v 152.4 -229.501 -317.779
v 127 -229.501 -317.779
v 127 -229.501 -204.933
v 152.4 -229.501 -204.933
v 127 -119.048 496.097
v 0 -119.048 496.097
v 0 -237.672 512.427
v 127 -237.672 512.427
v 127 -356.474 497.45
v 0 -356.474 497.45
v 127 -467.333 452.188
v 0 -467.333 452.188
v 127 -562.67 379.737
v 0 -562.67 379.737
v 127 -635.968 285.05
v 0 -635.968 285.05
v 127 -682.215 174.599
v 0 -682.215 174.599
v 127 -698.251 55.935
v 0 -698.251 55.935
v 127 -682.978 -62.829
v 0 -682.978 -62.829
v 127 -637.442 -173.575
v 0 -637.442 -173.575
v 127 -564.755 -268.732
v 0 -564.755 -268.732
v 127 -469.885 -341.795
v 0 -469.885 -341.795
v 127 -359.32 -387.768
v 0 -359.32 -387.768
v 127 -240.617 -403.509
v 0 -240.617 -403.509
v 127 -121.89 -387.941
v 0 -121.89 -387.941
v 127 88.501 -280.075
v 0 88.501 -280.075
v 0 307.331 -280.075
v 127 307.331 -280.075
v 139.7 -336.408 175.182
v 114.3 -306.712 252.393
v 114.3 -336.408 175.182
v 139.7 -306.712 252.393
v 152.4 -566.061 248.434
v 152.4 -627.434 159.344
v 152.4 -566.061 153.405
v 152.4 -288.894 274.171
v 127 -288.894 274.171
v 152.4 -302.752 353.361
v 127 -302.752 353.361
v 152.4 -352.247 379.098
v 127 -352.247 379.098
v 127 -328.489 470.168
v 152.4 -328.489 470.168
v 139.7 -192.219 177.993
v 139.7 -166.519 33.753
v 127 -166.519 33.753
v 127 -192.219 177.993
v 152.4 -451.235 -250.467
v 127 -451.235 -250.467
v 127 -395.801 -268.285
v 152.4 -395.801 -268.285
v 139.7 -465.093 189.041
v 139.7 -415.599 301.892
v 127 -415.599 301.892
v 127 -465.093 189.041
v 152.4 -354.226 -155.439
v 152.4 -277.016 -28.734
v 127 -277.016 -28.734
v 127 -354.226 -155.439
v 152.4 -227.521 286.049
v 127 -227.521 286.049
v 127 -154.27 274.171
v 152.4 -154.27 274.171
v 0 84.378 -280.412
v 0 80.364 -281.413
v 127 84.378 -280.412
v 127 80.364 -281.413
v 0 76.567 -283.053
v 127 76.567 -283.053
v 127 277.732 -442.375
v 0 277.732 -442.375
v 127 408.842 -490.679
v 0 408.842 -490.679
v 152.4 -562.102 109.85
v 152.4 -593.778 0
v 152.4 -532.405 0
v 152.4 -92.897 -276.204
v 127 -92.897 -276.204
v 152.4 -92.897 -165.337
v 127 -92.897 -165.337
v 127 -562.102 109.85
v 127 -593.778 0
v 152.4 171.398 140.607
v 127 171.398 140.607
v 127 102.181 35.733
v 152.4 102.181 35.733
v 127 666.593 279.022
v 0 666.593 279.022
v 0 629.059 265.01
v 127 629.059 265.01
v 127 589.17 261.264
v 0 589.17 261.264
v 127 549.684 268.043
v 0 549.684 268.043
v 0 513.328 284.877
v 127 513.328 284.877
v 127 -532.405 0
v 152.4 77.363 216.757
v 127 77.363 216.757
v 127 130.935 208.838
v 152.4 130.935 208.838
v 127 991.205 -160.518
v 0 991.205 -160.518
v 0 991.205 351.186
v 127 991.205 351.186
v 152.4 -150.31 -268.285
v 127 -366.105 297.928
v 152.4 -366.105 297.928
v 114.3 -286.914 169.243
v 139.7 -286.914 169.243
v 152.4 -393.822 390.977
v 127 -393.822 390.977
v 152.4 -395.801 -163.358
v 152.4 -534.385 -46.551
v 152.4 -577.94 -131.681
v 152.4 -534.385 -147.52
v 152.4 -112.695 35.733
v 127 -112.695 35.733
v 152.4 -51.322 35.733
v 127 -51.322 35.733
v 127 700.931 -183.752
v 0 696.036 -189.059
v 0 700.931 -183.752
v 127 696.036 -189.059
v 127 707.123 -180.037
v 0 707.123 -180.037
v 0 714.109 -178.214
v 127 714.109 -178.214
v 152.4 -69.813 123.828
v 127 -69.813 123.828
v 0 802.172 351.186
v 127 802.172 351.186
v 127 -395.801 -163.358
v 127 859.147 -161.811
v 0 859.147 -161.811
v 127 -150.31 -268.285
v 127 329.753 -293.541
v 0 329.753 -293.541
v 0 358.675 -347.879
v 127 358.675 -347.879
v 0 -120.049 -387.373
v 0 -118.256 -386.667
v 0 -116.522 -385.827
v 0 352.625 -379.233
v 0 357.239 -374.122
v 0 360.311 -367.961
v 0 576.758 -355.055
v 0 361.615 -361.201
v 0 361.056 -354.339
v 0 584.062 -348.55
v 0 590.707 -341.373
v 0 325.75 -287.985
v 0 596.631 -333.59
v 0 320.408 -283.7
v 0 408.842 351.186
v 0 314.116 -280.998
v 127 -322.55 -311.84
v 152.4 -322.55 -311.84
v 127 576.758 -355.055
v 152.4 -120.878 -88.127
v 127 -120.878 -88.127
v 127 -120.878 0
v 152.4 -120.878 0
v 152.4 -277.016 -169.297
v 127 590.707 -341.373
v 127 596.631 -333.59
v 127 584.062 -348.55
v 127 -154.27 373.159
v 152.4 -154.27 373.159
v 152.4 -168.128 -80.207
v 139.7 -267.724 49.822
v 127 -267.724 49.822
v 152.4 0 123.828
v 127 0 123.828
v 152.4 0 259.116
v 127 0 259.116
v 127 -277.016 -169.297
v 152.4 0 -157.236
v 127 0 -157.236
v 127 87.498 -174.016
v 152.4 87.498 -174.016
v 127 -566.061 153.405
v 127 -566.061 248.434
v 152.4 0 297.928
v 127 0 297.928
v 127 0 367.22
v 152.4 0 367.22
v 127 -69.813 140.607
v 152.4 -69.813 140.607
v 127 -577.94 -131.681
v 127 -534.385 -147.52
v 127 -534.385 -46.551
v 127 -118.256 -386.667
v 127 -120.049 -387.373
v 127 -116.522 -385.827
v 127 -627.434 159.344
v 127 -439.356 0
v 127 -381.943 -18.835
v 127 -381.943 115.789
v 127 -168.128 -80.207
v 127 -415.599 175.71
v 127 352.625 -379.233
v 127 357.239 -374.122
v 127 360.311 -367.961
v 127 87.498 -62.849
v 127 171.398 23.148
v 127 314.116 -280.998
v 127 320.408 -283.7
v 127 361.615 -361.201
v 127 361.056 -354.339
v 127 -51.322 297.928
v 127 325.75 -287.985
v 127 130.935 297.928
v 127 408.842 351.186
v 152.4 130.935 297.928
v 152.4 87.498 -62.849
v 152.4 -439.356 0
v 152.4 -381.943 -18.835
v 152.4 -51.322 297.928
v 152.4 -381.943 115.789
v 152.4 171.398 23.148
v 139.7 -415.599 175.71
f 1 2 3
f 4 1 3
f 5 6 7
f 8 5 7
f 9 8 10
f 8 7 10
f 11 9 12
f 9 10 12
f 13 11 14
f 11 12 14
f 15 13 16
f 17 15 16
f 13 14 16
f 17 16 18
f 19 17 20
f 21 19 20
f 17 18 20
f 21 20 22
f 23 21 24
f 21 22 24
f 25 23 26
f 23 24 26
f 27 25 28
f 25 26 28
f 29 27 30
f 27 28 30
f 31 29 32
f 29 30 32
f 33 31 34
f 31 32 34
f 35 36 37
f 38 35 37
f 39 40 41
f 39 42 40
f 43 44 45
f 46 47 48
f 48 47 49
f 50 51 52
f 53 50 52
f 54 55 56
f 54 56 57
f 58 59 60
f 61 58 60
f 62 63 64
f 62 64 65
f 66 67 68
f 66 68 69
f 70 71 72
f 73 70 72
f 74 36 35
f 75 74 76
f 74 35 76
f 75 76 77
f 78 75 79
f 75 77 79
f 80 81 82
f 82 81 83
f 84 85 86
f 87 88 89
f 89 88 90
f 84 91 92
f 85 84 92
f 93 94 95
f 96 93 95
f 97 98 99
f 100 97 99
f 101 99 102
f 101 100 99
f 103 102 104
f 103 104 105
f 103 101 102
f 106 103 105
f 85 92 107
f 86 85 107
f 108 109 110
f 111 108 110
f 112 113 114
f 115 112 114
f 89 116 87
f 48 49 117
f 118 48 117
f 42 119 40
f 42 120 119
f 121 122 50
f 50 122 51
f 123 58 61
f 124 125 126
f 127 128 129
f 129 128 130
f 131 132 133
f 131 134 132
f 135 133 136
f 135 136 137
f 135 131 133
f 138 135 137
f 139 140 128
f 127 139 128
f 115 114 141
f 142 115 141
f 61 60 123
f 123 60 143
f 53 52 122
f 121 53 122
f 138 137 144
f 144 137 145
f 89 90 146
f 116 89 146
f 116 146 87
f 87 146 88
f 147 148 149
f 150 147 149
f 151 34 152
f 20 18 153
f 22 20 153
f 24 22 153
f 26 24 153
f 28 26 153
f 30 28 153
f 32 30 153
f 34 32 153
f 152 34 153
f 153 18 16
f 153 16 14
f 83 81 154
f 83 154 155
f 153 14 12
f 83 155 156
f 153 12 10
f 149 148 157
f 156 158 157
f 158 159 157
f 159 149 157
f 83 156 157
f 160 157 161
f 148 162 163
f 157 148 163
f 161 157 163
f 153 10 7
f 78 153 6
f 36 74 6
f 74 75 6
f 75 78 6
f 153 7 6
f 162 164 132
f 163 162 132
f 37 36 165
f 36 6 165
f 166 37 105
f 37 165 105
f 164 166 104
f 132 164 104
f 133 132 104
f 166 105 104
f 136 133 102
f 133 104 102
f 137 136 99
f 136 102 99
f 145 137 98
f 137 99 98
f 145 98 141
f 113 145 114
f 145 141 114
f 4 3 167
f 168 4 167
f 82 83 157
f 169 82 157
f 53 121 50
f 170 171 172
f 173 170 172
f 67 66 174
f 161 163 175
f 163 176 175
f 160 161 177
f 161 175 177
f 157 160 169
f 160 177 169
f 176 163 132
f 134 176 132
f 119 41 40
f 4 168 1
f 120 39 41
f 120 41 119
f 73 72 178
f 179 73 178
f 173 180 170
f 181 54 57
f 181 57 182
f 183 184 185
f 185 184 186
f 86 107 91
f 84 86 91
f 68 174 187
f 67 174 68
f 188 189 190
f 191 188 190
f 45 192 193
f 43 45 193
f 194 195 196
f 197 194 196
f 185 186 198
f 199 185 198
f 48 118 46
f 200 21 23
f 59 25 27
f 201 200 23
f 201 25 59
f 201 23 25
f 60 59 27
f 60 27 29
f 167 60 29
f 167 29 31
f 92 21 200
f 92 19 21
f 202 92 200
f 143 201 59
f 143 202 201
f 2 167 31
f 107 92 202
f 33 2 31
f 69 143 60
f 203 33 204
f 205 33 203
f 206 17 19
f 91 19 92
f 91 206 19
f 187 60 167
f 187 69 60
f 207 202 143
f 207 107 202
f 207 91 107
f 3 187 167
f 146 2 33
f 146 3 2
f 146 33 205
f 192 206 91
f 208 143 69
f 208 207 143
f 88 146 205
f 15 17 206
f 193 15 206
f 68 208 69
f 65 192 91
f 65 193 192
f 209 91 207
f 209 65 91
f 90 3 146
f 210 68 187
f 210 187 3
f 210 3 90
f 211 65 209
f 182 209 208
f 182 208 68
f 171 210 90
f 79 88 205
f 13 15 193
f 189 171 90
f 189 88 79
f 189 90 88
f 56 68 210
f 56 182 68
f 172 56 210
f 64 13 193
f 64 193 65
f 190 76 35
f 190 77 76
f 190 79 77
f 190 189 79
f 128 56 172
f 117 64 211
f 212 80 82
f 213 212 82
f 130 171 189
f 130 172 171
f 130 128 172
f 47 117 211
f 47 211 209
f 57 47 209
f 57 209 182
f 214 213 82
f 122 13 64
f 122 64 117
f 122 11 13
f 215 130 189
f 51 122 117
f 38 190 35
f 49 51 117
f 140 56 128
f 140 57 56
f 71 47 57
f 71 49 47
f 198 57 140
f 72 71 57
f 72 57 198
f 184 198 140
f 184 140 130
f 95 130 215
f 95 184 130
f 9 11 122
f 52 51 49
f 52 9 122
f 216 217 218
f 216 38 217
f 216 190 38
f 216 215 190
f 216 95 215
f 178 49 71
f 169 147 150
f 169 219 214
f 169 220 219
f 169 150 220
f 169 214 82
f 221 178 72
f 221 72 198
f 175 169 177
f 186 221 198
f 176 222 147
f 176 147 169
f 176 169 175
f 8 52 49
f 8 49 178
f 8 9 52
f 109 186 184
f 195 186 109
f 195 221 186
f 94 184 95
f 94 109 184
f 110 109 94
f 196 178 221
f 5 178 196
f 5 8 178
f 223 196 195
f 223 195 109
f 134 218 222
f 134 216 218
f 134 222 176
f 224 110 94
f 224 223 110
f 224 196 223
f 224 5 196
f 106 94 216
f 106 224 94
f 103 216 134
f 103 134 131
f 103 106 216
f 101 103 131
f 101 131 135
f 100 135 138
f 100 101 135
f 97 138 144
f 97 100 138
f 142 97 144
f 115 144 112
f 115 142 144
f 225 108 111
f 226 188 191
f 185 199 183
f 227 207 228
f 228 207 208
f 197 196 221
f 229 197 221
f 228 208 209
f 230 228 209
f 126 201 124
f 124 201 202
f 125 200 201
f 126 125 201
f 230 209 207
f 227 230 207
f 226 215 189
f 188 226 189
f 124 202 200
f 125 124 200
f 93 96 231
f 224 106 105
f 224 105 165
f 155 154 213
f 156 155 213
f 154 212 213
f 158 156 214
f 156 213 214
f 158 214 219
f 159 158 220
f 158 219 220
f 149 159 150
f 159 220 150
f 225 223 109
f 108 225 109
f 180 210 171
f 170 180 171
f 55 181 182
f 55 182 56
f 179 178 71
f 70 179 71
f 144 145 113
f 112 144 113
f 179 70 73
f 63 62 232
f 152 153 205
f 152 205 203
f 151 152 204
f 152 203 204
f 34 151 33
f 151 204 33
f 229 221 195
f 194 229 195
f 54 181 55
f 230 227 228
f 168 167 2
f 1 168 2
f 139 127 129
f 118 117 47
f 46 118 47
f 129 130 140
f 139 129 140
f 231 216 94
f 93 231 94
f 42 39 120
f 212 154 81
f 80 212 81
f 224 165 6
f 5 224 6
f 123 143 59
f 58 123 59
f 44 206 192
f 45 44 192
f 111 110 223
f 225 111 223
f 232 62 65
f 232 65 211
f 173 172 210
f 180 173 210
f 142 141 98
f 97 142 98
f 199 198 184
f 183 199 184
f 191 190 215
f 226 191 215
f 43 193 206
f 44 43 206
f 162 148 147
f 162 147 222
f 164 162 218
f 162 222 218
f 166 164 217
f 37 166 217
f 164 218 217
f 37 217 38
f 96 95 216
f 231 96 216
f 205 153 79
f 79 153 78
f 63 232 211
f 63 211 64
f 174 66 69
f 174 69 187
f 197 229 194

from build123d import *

# Parameters (mm, degrees)
F1_DEPTH  = 127
F2_R      = 152.4
F3_R      = 101.6
F4_R      = 25.4
F5_R      = 25.4
F6_R      = 25.4
F7_R      = 25.4
F8_R      = 25.4
F10_DEPTH = 12.7
F12_DEPTH = 12.7
F14_DEPTH = 12.7
F16_DEPTH = 25.4
F18_DEPTH = 25.4
F20_DEPTH = 25.4
F22_DEPTH = 25.4


with BuildPart() as f1:
    # F0 (on Right) → F1 (new body)
    with BuildSketch(Plane.YZ):
        with BuildLine():
            Line((859.147251, -161.810681), (991.205215, -160.518155))
            Line((991.205215, -160.518155), (991.205215, 351.185709))
            Line((991.205215, 351.185709), (802.172363, 351.185709))
            Line((802.172363, 351.185709), (588.256001, 237.326965))
            Line((588.256001, 237.326965), (408.842146, 351.185709))
            Line((408.842146, 351.185709), (-119.048476, 496.096849))
            ThreePointArc((-119.048476, 496.096849), (-698.252899, 54.46288), (-119.048476, -387.17109))
            Line((-119.048476, -387.17109), (82.162218, -280.075041))
            Line((82.162218, -280.075041), (322.585523, -280.075041))
            Line((322.585523, -280.075041), (368.320072, -366.00053))
            Line((368.320072, -366.00053), (277.732104, -442.375332))
            Line((277.732104, -442.375332), (408.842146, -490.679055))
            Line((408.842146, -490.679055), (588.256001, -345.767885))
            Line((588.256001, -345.767885), (702.599406, -179.515481))
            Line((702.599406, -179.515481), (859.147251, -161.810681))
        make_face()
    extrude(amount=F1_DEPTH)

    # F2
    f2_edges = [f1.edges().sort_by_distance(p)[0] for p in [
        (63.5, 588.256001, 237.326965),
    ]]
    fillet(f2_edges, radius=F2_R)

    # F3
    f3_edges = [f1.edges().sort_by_distance(p)[0] for p in [
        (63.5, 588.256001, -345.767885),
    ]]
    fillet(f3_edges, radius=F3_R)

    # F4
    f4_edges = [f1.edges().sort_by_distance(p)[0] for p in [
        (63.5, 368.320072, -366.00053),
    ]]
    fillet(f4_edges, radius=F4_R)

    # F5
    f5_edges = [f1.edges().sort_by_distance(p)[0] for p in [
        (63.5, 322.585523, -280.075041),
    ]]
    fillet(f5_edges, radius=F5_R)

    # F6
    f6_edges = [f1.edges().sort_by_distance(p)[0] for p in [
        (63.5, 702.599406, -179.515481),
    ]]
    fillet(f6_edges, radius=F6_R)

    # F7
    f7_edges = [f1.edges().sort_by_distance(p)[0] for p in [
        (63.5, 82.162218, -280.075041),
    ]]
    fillet(f7_edges, radius=F7_R)

    # F8
    f8_edges = [f1.edges().sort_by_distance(p)[0] for p in [
        (63.5, -119.048476, -387.17109),
    ]]
    fillet(f8_edges, radius=F8_R)

    # F9 (on face) → F10 (join, symmetric)
    with BuildSketch(Plane.YZ.offset(127)):
        Polygon((-415.599138, 301.891834), (-465.093285, 189.040735), (-415.599138, 175.709584), align=None)
    extrude(amount=F10_DEPTH, both=True)

    # F13 (on face) → F14 (join, symmetric)
    with BuildSketch(Plane.YZ.offset(127)):
        Polygon((-192.2189, 177.992597), (-267.723858, 49.822465), (-166.519001, 33.752684), align=None)
    extrude(amount=F14_DEPTH, both=True)

    # F15 (on face) → F16 (join, symmetric)
    with BuildSketch(Plane.YZ.offset(127)):
        Polygon((-277.015507, -28.733557), (-354.226381, -155.438602), (-277.015507, -169.29698), align=None)
    extrude(amount=F16_DEPTH, both=True)

    # F17 (on face) → F18 (join)
    with BuildSketch(Plane.YZ.offset(127)):
        Polygon((-381.943107, 115.789391), (-439.356327, 0), (-381.943107, -18.834727), align=None)
    extrude(amount=F18_DEPTH)

    # F19 (on face) → F20 (join)
    with BuildSketch(Plane.YZ.offset(127)):
        Polygon((0, 259.116122), (-69.813408, 140.607432), (0, 123.82751), align=None)
        Polygon((171.39788, 140.607432), (102.180727, 35.732955), (171.39788, 23.148015), align=None)
        Polygon((87.498307, -62.849045), (0, -157.236069), (87.498307, -174.015984), align=None)
    extrude(amount=F20_DEPTH)

    # F21 (on face) → F22 (join)
    with BuildSketch(Plane.YZ.offset(127)):
        Polygon((-562.101841, 109.850086), (-593.778133, 0), (-532.405376, 0), align=None)
        Polygon((-534.385145, -46.551459), (-577.939987, -131.681412), (-534.385145, -147.519529), align=None)
        Polygon((-395.801485, -163.357675), (-451.234937, -250.46742), (-395.801485, -268.285304), align=None)
        Polygon((-229.501098, -204.932764), (-322.550118, -311.840147), (-229.501098, -317.779452), align=None)
        Polygon((-92.897221, -165.337443), (-150.310442, -268.285304), (-92.897221, -276.204377), align=None)
        Polygon((-120.878155, 0), (-168.128341, -80.207482), (-120.878155, -88.126548), align=None)
        Polygon((-69.813408, 123.82751), (-112.694882, 35.732955), (-51.322125, 35.732955), align=None)
        Polygon((-154.269978, 373.159021), (-227.52133, 286.049277), (-154.269978, 274.170697), align=None)
        Polygon((-302.752465, 353.361368), (-366.10499, 297.927916), (-288.894087, 274.170697), align=None)
        Polygon((-328.489423, 470.167577), (-393.821716, 390.976906), (-352.246642, 379.098326), align=None)
        Polygon((0, 367.219716), (-51.322125, 297.927916), (0, 297.927916), align=None)
        Polygon((130.935183, 297.927916), (77.362694, 216.757476), (130.935183, 208.838403), align=None)
        Polygon((-566.061378, 248.433739), (-627.434134, 159.344256), (-566.061378, 153.404951), align=None)
    extrude(amount=F22_DEPTH)


with BuildPart() as f12:
    # F11 (on face) → F12 (new body, symmetric)
    with BuildSketch(Plane.YZ.offset(127)):
        Polygon((-306.712002, 252.393275), (-336.408466, 175.182387), (-286.914319, 169.243068), align=None)
    extrude(amount=F12_DEPTH, both=True)


solid = Compound([f1.part, f12.part])
